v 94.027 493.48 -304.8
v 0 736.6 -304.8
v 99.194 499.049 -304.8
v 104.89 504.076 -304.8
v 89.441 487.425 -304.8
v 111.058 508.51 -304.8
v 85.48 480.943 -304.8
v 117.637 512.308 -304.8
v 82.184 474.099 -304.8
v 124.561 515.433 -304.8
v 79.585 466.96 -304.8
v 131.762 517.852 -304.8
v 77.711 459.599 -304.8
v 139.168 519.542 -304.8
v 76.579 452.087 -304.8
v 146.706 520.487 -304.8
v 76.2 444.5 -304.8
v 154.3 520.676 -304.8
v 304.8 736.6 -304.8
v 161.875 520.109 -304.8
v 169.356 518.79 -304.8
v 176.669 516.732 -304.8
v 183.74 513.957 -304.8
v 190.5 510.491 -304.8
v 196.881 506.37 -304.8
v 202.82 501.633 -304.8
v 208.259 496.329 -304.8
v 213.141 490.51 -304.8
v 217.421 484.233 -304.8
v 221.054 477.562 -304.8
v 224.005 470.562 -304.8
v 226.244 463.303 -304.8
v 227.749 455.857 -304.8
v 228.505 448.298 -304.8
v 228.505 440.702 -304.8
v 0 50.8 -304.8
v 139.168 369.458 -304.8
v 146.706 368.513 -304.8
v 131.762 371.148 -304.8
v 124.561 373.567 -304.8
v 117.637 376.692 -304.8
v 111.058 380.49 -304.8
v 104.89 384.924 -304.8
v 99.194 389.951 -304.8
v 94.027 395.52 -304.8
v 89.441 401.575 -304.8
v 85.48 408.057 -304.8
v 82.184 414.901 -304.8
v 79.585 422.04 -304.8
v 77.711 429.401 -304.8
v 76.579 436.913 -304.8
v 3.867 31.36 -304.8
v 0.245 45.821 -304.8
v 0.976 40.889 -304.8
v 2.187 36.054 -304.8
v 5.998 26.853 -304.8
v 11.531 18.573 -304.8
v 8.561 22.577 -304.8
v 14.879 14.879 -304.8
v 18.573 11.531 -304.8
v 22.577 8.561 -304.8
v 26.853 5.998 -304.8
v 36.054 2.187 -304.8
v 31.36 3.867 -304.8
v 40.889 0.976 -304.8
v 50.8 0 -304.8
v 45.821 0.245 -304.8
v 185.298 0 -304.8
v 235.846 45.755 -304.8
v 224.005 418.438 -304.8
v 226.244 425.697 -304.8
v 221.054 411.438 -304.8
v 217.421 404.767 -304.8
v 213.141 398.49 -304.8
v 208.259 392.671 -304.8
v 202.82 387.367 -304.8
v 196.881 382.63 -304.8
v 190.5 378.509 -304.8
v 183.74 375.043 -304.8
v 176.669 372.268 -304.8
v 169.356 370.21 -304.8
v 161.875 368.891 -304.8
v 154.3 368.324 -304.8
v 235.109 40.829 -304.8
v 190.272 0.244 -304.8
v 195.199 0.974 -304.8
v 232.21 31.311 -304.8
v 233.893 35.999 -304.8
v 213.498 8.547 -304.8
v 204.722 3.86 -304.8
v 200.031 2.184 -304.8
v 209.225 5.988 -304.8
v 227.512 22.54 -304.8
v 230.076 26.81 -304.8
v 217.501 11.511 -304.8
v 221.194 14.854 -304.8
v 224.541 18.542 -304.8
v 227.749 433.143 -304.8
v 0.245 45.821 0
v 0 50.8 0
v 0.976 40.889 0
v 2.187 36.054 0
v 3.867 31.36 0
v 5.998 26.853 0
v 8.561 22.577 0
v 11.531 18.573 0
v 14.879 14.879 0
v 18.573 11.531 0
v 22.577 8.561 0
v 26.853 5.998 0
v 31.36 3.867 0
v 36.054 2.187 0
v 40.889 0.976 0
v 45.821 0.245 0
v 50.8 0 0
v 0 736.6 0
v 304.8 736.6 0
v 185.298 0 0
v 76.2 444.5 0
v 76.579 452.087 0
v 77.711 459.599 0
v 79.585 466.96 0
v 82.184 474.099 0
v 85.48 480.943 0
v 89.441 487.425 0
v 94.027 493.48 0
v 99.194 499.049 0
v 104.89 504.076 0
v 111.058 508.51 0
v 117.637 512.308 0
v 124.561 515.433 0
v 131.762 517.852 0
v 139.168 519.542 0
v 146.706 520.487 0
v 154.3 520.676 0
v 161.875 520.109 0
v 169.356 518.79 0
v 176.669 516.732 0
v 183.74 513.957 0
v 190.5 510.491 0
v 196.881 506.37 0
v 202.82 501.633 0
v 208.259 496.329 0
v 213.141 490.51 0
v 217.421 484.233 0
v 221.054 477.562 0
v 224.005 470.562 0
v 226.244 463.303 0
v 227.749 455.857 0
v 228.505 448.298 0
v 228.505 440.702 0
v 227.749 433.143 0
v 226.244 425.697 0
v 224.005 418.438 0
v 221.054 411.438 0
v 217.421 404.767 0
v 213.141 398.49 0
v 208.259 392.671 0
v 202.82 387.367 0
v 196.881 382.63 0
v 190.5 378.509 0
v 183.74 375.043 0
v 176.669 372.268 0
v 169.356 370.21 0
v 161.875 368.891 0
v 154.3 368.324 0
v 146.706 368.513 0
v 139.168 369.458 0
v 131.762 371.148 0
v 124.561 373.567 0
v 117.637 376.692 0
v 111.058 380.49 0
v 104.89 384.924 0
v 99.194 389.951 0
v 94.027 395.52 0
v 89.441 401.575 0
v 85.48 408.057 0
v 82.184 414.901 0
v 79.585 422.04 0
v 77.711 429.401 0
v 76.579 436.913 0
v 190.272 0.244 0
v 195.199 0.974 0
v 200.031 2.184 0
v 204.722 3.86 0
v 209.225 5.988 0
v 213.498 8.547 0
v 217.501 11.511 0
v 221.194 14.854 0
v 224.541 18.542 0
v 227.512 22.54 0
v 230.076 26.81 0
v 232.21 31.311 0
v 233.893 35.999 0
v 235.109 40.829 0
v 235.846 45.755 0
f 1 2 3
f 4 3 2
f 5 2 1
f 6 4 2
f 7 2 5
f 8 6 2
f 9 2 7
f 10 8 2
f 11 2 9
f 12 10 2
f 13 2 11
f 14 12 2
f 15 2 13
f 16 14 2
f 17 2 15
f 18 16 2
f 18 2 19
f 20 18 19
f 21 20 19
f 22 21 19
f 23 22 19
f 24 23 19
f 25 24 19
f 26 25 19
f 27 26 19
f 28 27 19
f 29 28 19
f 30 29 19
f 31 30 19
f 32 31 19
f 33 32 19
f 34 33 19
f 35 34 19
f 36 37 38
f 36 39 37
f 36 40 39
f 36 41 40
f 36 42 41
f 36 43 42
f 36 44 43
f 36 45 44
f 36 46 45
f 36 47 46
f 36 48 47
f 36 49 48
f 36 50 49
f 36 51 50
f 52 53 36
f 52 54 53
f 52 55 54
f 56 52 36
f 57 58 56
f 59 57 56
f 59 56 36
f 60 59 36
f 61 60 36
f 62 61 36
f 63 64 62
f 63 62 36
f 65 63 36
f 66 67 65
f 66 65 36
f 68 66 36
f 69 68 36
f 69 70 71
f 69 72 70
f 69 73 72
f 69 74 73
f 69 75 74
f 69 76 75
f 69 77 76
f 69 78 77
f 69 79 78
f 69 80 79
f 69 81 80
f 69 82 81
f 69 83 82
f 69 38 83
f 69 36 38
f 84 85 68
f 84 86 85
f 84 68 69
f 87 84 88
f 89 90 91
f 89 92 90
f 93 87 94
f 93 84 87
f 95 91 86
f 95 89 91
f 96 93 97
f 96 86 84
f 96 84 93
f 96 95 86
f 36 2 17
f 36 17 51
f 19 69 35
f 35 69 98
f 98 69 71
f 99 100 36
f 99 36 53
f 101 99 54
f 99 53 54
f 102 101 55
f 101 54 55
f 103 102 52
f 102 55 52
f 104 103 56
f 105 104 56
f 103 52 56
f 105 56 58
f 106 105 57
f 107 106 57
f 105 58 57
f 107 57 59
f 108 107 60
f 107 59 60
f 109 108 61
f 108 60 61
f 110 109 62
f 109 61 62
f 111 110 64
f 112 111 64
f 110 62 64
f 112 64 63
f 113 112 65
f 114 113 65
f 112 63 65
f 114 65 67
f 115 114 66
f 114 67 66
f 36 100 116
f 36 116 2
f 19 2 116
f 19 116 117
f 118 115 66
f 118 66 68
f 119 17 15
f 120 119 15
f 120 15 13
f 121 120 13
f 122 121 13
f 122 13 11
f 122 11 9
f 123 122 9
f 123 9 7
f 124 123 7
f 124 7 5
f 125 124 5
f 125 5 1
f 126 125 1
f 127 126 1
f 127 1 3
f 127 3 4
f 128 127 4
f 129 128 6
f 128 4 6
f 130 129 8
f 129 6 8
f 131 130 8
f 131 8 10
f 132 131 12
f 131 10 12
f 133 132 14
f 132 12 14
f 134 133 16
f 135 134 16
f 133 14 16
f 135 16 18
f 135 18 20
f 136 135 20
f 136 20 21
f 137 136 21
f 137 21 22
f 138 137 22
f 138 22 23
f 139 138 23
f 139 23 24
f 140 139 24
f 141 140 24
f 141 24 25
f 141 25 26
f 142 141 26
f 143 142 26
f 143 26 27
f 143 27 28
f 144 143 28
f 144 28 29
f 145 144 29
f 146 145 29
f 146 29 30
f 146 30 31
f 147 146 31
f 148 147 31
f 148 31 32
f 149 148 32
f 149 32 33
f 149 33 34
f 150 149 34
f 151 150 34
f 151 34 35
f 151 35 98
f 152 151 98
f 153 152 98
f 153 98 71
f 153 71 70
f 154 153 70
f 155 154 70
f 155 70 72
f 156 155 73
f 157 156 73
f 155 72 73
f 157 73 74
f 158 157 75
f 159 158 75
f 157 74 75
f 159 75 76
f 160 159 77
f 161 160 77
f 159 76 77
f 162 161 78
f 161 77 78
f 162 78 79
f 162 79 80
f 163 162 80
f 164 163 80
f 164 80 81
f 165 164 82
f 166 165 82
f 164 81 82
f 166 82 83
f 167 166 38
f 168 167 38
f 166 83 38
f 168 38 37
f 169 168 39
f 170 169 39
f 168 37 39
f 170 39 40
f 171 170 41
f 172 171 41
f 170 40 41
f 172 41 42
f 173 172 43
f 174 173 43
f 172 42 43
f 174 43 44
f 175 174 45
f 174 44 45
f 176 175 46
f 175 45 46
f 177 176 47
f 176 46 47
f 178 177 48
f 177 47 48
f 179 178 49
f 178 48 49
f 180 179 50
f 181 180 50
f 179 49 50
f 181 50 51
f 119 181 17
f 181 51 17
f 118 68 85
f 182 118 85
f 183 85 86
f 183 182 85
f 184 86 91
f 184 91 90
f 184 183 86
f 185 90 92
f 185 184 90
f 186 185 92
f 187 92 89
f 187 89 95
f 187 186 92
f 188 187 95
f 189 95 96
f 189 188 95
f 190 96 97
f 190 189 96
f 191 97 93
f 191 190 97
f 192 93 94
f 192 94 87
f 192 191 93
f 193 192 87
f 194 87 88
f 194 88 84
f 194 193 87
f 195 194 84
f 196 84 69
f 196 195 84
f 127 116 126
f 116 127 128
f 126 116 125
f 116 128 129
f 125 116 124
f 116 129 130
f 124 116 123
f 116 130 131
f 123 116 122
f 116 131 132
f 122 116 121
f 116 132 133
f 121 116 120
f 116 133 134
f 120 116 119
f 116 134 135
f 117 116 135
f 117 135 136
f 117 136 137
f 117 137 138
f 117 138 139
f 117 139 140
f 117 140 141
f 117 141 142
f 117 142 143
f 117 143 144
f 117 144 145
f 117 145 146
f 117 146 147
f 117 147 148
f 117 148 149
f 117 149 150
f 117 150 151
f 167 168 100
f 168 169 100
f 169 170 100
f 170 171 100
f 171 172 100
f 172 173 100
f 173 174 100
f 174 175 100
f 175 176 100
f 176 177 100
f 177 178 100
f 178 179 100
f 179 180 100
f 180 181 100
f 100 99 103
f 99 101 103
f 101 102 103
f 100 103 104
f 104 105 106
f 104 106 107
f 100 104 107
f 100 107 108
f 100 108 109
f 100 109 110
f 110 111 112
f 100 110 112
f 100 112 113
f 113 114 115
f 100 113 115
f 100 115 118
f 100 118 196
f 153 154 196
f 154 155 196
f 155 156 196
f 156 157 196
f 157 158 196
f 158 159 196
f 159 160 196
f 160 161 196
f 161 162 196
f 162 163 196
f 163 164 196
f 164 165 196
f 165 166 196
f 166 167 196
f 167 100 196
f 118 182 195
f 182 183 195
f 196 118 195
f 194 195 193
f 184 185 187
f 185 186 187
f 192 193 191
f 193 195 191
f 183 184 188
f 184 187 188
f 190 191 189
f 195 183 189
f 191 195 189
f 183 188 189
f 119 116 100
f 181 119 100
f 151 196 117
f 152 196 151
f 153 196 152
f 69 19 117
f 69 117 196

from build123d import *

# Parameters (mm, degrees)
SKETCH1_W           = 304.8
SKETCH1_H           = 304.8
BOSS_EXTRUDE1_DEPTH = 736.6
CUT_EXTRUDE1_REACH  = 855.455
SKETCH2_R           = 76.2
FILLET1_R           = 50.8


with BuildPart() as part:
    # Sketch1 → Boss-Extrude1 (new body)
    with BuildSketch(Plane(origin=(0, 0, 0), x_dir=(1, 0, 0), z_dir=(0, 1, 0))):
        with Locations((152.4, 152.4)):
            Rectangle(SKETCH1_W, SKETCH1_H)
    extrude(amount=BOSS_EXTRUDE1_DEPTH)

    # Sketch2 → Cut-Extrude1 (cut, up to next)
    with BuildSketch(Plane(origin=(0, 0, -304.8), x_dir=(-1, 0, 0), z_dir=(0, 0, -1)), mode=Mode.PRIVATE) as cut_extrude1_sk1:
        with Locations((-152.4, 444.5)):
            Circle(SKETCH2_R)
    cut_extrude1_tool1 = extrude(cut_extrude1_sk1.sketch, amount=-CUT_EXTRUDE1_REACH, mode=Mode.PRIVATE) & part.part
    # Sketch2 → Cut-Extrude1 (cut, up to next)
    with BuildSketch(Plane(origin=(0, 0, -304.8), x_dir=(-1, 0, 0), z_dir=(0, 0, -1)), mode=Mode.PRIVATE) as cut_extrude1_sk2:
        Polygon((-304.8, 736.6), (-231.279579983, 0), (-304.8, 0), align=None)
    cut_extrude1_tool2 = extrude(cut_extrude1_sk2.sketch, amount=-CUT_EXTRUDE1_REACH, mode=Mode.PRIVATE) & part.part
    add(cut_extrude1_tool1.solids().sort_by_distance((152.4, 444.5, -304.8))[0], mode=Mode.SUBTRACT)
    add(cut_extrude1_tool2.solids().sort_by_distance((280.293193, 245.533333, -304.8))[0], mode=Mode.SUBTRACT)

    # Fillet1
    fillet1_edges = [part.edges().sort_by_distance(p)[0] for p in [
        (231.279579983, 0, -152.4),
        (0, 0, -152.4),
    ]]
    fillet(fillet1_edges, radius=FILLET1_R)


solid = part.part
